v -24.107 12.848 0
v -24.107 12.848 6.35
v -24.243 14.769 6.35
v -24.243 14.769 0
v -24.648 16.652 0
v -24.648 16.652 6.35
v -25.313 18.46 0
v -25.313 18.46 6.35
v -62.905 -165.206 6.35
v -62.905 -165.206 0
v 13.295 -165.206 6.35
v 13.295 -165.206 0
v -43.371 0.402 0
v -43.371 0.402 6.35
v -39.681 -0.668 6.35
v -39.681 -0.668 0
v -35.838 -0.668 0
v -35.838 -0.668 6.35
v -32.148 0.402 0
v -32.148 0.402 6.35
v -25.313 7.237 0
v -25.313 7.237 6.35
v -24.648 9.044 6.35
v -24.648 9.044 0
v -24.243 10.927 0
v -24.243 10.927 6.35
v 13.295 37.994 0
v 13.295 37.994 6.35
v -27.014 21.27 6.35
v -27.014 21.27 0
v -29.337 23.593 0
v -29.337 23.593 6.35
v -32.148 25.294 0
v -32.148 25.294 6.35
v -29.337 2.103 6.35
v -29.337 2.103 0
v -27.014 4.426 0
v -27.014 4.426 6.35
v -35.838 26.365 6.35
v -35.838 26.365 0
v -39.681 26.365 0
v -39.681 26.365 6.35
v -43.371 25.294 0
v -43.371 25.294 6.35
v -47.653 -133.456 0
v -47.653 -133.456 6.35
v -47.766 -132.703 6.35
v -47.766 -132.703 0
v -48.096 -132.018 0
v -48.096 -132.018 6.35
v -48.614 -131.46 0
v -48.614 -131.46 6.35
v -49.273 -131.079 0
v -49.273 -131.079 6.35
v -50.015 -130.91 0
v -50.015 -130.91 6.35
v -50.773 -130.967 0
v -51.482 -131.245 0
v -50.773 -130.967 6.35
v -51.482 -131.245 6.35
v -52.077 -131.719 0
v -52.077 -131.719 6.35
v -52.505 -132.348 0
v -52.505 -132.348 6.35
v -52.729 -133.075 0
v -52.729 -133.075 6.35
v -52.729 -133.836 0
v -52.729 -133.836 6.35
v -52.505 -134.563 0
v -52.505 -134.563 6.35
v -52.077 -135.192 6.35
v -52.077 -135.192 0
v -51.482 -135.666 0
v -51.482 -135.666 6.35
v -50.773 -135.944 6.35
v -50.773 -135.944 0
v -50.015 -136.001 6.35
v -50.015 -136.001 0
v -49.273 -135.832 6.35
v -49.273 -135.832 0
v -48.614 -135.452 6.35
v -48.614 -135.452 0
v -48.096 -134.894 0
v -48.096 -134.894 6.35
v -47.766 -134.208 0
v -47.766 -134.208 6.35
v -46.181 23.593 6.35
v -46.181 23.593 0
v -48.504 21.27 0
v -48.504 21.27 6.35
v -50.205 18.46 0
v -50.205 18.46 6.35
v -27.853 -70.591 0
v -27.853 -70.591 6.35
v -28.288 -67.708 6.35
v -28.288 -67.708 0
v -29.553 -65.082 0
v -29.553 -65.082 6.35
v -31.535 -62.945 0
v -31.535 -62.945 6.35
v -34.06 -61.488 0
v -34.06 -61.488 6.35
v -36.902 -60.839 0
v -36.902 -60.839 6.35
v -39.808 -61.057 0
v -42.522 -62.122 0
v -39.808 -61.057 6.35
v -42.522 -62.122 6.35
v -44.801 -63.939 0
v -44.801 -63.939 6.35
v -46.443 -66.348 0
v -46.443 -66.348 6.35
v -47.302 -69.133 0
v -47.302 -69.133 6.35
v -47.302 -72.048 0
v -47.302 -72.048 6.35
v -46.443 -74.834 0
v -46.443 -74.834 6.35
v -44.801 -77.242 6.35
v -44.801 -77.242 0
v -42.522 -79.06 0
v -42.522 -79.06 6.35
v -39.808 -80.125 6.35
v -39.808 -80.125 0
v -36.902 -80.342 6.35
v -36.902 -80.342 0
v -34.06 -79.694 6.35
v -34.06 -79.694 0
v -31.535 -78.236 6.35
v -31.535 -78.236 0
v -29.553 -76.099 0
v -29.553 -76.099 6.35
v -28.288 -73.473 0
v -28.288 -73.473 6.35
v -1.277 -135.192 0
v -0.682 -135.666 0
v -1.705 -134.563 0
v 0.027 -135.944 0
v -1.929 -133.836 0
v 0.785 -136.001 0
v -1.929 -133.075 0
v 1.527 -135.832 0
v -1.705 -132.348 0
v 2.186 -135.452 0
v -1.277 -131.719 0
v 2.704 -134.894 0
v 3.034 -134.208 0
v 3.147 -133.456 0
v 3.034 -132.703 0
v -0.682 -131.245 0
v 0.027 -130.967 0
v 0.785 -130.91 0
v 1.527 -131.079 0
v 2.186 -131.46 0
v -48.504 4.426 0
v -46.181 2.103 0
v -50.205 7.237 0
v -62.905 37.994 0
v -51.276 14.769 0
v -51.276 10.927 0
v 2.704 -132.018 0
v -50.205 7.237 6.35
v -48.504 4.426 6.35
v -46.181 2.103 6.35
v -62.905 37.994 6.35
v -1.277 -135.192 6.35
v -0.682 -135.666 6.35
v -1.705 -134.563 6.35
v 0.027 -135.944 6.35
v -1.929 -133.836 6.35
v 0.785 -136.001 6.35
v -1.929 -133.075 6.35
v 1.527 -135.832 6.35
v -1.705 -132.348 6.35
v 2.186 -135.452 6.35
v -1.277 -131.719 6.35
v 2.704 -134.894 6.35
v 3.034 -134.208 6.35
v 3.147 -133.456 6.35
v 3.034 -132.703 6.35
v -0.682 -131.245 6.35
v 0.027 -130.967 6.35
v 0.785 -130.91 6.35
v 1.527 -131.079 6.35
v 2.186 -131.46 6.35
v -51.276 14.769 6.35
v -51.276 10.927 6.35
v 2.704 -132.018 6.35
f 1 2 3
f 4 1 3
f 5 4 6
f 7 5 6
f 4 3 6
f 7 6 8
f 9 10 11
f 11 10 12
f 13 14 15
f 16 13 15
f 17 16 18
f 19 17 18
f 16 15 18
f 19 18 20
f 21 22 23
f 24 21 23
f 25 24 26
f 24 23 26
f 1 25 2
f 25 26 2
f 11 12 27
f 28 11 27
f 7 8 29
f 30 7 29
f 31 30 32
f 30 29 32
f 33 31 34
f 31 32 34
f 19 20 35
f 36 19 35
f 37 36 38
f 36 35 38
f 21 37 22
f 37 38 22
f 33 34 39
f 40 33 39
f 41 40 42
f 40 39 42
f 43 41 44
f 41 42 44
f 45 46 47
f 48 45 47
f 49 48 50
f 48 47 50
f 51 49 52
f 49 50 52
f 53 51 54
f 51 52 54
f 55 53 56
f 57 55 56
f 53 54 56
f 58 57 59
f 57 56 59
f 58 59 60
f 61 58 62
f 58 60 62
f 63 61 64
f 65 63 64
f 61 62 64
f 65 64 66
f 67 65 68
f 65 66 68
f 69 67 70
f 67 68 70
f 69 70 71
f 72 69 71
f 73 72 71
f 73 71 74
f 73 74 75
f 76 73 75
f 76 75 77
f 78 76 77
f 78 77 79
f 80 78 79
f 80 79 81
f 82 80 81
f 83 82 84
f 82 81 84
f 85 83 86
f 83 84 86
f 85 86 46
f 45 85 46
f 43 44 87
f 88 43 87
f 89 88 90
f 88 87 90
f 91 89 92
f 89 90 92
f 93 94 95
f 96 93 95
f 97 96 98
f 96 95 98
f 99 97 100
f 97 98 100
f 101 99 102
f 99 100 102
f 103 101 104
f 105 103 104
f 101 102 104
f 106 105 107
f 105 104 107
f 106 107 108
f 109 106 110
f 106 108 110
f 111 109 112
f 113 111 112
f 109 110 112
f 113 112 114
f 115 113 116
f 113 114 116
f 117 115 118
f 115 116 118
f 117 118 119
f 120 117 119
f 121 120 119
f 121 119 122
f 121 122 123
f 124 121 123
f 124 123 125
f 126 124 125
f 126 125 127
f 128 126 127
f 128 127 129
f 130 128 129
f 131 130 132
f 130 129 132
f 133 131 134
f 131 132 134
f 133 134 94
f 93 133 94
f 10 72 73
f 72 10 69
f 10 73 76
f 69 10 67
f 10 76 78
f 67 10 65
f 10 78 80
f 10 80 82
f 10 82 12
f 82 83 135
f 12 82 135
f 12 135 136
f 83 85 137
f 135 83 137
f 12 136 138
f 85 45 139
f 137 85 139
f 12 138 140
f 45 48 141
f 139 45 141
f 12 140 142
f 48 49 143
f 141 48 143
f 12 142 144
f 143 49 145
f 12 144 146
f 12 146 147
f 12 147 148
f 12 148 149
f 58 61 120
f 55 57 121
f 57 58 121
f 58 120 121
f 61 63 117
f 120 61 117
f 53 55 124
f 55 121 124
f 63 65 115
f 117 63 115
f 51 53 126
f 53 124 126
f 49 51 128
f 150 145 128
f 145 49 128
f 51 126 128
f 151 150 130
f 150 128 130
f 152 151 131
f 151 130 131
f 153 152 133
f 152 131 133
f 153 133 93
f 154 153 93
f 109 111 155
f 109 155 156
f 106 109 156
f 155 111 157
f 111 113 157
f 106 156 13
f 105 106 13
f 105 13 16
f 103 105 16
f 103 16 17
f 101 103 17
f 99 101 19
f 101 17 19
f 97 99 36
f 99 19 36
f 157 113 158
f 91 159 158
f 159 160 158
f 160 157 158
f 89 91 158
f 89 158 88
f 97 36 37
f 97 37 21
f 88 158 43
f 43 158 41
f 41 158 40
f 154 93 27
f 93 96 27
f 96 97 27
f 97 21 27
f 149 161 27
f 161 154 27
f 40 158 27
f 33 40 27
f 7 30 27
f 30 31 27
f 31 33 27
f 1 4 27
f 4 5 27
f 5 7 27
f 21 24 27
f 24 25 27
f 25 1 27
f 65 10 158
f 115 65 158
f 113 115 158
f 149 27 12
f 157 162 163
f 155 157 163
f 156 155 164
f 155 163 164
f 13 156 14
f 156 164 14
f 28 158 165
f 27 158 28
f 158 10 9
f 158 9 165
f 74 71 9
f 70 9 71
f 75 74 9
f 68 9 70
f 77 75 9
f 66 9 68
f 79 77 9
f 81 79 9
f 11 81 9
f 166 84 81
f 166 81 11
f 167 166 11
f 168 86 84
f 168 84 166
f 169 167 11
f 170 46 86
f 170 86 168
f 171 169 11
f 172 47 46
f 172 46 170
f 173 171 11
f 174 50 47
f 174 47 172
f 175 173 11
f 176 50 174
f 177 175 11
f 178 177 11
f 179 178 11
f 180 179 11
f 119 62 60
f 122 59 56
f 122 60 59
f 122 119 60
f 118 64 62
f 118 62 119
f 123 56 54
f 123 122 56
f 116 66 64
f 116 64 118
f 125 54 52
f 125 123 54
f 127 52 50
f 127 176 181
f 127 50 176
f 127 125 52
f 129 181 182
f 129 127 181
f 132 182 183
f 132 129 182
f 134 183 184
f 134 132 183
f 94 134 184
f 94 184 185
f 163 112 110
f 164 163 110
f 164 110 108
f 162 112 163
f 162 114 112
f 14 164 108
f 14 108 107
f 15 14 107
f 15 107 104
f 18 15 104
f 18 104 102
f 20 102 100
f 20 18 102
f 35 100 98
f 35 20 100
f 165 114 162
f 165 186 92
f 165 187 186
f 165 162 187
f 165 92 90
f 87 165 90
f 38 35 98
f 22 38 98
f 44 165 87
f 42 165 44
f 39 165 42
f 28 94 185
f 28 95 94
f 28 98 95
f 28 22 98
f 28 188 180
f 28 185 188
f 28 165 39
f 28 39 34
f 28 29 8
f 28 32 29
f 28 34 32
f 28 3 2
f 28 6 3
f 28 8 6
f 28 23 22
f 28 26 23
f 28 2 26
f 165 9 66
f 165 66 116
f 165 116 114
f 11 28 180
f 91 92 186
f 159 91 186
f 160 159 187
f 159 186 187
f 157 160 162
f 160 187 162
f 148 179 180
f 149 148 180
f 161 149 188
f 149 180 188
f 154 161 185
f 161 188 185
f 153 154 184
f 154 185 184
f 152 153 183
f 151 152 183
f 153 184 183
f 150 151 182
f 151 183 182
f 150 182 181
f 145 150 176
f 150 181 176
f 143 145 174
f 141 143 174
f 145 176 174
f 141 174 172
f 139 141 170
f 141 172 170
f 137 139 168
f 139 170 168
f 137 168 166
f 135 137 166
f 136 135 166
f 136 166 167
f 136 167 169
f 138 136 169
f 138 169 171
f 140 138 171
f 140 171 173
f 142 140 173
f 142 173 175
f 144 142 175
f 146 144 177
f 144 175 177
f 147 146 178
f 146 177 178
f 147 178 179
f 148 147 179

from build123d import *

# Parameters (mm, degrees)
SKETCH1_W           = 76.2
SKETCH1_H           = 203.2
BOSS_EXTRUDE1_DEPTH = 6.35
SKETCH2_R           = 9.779
SKETCH2_R_2         = 2.5527
CUT_EXTRUDE1_DEPTH  = 6.35
CUT_EXTRUDE3_DEPTH  = 6.35


with BuildPart() as part:
    # Sketch1 → Boss-Extrude1 (new body)
    with BuildSketch(Plane.XY):
        with Locations((-24.805306972, -63.605723205)):
            Rectangle(SKETCH1_W, SKETCH1_H)
    extrude(amount=BOSS_EXTRUDE1_DEPTH)

    # Sketch2 → Cut-Extrude1 (cut)
    with BuildSketch(Plane.XY.offset(6.35)):
        with Locations((-37.632306972, -70.590723205)):
            Circle(SKETCH2_R)
        with Locations((-50.205306972, -133.455723205)):
            Circle(SKETCH2_R_2)
        with Locations((0.594693028, -133.455723205)):
            Circle(SKETCH2_R_2)
    extrude(amount=-CUT_EXTRUDE1_DEPTH, mode=Mode.SUBTRACT)

    # Sketch7 → Cut-Extrude3 (cut)
    with BuildSketch(Plane.XY.offset(6.35)):
        with BuildLine():
            Line((-37.759306972, 25.294276795), (-37.759306972, 0.402276795))
            Line((-37.759306972, 0.402276795), (-32.147904273, 0.402276795))
            ThreePointArc((-32.147904273, 0.402276795), (-28.105531642, 3.194501465), (-25.313306972, 7.236874096))
            Line((-25.313306972, 7.236874096), (-25.313306972, 18.459679494))
            ThreePointArc((-25.313306972, 18.459679494), (-28.105531642, 22.502052125), (-32.147904273, 25.294276795))
            Line((-32.147904273, 25.294276795), (-37.759306972, 25.294276795))
        make_face()
        with BuildLine():
            Line((-25.313306972, 18.459679494), (-25.313306972, 7.236874096))
            ThreePointArc((-25.313306972, 7.236874096), (-24.411839586, 9.978456134), (-24.106806972, 12.848276795))
            ThreePointArc((-24.106806972, 12.848276795), (-24.411839586, 15.718097456), (-25.313306972, 18.459679494))
        make_face()
        with BuildLine():
            Line((-43.370709671, 25.294276795), (-37.759306972, 25.294276795))
            Line((-37.759306972, 25.294276795), (-32.147904273, 25.294276795))
            ThreePointArc((-32.147904273, 25.294276795), (-37.759306972, 26.500776795), (-43.370709671, 25.294276795))
        make_face()
        with BuildLine():
            Line((-32.147904273, 0.402276795), (-37.759306972, 0.402276795))
            Line((-37.759306972, 0.402276795), (-43.370709671, 0.402276795))
            ThreePointArc((-43.370709671, 0.402276795), (-37.759306972, -0.804223205), (-32.147904273, 0.402276795))
        make_face()
        with BuildLine():
            Line((-43.370709671, 0.402276795), (-37.759306972, 0.402276795))
            Line((-37.759306972, 0.402276795), (-37.759306972, 25.294276795))
            Line((-37.759306972, 25.294276795), (-43.370709671, 25.294276795))
            ThreePointArc((-43.370709671, 25.294276795), (-47.413082302, 22.502052125), (-50.205306972, 18.459679494))
            Line((-50.205306972, 18.459679494), (-50.205306972, 7.236874096))
            ThreePointArc((-50.205306972, 7.236874096), (-47.413082302, 3.194501465), (-43.370709671, 0.402276795))
        make_face()
        with BuildLine():
            ThreePointArc((-50.205306972, 18.459679494), (-51.411806972, 12.848276795), (-50.205306972, 7.236874096))
            Line((-50.205306972, 7.236874096), (-50.205306972, 18.459679494))
        make_face()
    extrude(amount=-CUT_EXTRUDE3_DEPTH, mode=Mode.SUBTRACT)


solid = part.part
